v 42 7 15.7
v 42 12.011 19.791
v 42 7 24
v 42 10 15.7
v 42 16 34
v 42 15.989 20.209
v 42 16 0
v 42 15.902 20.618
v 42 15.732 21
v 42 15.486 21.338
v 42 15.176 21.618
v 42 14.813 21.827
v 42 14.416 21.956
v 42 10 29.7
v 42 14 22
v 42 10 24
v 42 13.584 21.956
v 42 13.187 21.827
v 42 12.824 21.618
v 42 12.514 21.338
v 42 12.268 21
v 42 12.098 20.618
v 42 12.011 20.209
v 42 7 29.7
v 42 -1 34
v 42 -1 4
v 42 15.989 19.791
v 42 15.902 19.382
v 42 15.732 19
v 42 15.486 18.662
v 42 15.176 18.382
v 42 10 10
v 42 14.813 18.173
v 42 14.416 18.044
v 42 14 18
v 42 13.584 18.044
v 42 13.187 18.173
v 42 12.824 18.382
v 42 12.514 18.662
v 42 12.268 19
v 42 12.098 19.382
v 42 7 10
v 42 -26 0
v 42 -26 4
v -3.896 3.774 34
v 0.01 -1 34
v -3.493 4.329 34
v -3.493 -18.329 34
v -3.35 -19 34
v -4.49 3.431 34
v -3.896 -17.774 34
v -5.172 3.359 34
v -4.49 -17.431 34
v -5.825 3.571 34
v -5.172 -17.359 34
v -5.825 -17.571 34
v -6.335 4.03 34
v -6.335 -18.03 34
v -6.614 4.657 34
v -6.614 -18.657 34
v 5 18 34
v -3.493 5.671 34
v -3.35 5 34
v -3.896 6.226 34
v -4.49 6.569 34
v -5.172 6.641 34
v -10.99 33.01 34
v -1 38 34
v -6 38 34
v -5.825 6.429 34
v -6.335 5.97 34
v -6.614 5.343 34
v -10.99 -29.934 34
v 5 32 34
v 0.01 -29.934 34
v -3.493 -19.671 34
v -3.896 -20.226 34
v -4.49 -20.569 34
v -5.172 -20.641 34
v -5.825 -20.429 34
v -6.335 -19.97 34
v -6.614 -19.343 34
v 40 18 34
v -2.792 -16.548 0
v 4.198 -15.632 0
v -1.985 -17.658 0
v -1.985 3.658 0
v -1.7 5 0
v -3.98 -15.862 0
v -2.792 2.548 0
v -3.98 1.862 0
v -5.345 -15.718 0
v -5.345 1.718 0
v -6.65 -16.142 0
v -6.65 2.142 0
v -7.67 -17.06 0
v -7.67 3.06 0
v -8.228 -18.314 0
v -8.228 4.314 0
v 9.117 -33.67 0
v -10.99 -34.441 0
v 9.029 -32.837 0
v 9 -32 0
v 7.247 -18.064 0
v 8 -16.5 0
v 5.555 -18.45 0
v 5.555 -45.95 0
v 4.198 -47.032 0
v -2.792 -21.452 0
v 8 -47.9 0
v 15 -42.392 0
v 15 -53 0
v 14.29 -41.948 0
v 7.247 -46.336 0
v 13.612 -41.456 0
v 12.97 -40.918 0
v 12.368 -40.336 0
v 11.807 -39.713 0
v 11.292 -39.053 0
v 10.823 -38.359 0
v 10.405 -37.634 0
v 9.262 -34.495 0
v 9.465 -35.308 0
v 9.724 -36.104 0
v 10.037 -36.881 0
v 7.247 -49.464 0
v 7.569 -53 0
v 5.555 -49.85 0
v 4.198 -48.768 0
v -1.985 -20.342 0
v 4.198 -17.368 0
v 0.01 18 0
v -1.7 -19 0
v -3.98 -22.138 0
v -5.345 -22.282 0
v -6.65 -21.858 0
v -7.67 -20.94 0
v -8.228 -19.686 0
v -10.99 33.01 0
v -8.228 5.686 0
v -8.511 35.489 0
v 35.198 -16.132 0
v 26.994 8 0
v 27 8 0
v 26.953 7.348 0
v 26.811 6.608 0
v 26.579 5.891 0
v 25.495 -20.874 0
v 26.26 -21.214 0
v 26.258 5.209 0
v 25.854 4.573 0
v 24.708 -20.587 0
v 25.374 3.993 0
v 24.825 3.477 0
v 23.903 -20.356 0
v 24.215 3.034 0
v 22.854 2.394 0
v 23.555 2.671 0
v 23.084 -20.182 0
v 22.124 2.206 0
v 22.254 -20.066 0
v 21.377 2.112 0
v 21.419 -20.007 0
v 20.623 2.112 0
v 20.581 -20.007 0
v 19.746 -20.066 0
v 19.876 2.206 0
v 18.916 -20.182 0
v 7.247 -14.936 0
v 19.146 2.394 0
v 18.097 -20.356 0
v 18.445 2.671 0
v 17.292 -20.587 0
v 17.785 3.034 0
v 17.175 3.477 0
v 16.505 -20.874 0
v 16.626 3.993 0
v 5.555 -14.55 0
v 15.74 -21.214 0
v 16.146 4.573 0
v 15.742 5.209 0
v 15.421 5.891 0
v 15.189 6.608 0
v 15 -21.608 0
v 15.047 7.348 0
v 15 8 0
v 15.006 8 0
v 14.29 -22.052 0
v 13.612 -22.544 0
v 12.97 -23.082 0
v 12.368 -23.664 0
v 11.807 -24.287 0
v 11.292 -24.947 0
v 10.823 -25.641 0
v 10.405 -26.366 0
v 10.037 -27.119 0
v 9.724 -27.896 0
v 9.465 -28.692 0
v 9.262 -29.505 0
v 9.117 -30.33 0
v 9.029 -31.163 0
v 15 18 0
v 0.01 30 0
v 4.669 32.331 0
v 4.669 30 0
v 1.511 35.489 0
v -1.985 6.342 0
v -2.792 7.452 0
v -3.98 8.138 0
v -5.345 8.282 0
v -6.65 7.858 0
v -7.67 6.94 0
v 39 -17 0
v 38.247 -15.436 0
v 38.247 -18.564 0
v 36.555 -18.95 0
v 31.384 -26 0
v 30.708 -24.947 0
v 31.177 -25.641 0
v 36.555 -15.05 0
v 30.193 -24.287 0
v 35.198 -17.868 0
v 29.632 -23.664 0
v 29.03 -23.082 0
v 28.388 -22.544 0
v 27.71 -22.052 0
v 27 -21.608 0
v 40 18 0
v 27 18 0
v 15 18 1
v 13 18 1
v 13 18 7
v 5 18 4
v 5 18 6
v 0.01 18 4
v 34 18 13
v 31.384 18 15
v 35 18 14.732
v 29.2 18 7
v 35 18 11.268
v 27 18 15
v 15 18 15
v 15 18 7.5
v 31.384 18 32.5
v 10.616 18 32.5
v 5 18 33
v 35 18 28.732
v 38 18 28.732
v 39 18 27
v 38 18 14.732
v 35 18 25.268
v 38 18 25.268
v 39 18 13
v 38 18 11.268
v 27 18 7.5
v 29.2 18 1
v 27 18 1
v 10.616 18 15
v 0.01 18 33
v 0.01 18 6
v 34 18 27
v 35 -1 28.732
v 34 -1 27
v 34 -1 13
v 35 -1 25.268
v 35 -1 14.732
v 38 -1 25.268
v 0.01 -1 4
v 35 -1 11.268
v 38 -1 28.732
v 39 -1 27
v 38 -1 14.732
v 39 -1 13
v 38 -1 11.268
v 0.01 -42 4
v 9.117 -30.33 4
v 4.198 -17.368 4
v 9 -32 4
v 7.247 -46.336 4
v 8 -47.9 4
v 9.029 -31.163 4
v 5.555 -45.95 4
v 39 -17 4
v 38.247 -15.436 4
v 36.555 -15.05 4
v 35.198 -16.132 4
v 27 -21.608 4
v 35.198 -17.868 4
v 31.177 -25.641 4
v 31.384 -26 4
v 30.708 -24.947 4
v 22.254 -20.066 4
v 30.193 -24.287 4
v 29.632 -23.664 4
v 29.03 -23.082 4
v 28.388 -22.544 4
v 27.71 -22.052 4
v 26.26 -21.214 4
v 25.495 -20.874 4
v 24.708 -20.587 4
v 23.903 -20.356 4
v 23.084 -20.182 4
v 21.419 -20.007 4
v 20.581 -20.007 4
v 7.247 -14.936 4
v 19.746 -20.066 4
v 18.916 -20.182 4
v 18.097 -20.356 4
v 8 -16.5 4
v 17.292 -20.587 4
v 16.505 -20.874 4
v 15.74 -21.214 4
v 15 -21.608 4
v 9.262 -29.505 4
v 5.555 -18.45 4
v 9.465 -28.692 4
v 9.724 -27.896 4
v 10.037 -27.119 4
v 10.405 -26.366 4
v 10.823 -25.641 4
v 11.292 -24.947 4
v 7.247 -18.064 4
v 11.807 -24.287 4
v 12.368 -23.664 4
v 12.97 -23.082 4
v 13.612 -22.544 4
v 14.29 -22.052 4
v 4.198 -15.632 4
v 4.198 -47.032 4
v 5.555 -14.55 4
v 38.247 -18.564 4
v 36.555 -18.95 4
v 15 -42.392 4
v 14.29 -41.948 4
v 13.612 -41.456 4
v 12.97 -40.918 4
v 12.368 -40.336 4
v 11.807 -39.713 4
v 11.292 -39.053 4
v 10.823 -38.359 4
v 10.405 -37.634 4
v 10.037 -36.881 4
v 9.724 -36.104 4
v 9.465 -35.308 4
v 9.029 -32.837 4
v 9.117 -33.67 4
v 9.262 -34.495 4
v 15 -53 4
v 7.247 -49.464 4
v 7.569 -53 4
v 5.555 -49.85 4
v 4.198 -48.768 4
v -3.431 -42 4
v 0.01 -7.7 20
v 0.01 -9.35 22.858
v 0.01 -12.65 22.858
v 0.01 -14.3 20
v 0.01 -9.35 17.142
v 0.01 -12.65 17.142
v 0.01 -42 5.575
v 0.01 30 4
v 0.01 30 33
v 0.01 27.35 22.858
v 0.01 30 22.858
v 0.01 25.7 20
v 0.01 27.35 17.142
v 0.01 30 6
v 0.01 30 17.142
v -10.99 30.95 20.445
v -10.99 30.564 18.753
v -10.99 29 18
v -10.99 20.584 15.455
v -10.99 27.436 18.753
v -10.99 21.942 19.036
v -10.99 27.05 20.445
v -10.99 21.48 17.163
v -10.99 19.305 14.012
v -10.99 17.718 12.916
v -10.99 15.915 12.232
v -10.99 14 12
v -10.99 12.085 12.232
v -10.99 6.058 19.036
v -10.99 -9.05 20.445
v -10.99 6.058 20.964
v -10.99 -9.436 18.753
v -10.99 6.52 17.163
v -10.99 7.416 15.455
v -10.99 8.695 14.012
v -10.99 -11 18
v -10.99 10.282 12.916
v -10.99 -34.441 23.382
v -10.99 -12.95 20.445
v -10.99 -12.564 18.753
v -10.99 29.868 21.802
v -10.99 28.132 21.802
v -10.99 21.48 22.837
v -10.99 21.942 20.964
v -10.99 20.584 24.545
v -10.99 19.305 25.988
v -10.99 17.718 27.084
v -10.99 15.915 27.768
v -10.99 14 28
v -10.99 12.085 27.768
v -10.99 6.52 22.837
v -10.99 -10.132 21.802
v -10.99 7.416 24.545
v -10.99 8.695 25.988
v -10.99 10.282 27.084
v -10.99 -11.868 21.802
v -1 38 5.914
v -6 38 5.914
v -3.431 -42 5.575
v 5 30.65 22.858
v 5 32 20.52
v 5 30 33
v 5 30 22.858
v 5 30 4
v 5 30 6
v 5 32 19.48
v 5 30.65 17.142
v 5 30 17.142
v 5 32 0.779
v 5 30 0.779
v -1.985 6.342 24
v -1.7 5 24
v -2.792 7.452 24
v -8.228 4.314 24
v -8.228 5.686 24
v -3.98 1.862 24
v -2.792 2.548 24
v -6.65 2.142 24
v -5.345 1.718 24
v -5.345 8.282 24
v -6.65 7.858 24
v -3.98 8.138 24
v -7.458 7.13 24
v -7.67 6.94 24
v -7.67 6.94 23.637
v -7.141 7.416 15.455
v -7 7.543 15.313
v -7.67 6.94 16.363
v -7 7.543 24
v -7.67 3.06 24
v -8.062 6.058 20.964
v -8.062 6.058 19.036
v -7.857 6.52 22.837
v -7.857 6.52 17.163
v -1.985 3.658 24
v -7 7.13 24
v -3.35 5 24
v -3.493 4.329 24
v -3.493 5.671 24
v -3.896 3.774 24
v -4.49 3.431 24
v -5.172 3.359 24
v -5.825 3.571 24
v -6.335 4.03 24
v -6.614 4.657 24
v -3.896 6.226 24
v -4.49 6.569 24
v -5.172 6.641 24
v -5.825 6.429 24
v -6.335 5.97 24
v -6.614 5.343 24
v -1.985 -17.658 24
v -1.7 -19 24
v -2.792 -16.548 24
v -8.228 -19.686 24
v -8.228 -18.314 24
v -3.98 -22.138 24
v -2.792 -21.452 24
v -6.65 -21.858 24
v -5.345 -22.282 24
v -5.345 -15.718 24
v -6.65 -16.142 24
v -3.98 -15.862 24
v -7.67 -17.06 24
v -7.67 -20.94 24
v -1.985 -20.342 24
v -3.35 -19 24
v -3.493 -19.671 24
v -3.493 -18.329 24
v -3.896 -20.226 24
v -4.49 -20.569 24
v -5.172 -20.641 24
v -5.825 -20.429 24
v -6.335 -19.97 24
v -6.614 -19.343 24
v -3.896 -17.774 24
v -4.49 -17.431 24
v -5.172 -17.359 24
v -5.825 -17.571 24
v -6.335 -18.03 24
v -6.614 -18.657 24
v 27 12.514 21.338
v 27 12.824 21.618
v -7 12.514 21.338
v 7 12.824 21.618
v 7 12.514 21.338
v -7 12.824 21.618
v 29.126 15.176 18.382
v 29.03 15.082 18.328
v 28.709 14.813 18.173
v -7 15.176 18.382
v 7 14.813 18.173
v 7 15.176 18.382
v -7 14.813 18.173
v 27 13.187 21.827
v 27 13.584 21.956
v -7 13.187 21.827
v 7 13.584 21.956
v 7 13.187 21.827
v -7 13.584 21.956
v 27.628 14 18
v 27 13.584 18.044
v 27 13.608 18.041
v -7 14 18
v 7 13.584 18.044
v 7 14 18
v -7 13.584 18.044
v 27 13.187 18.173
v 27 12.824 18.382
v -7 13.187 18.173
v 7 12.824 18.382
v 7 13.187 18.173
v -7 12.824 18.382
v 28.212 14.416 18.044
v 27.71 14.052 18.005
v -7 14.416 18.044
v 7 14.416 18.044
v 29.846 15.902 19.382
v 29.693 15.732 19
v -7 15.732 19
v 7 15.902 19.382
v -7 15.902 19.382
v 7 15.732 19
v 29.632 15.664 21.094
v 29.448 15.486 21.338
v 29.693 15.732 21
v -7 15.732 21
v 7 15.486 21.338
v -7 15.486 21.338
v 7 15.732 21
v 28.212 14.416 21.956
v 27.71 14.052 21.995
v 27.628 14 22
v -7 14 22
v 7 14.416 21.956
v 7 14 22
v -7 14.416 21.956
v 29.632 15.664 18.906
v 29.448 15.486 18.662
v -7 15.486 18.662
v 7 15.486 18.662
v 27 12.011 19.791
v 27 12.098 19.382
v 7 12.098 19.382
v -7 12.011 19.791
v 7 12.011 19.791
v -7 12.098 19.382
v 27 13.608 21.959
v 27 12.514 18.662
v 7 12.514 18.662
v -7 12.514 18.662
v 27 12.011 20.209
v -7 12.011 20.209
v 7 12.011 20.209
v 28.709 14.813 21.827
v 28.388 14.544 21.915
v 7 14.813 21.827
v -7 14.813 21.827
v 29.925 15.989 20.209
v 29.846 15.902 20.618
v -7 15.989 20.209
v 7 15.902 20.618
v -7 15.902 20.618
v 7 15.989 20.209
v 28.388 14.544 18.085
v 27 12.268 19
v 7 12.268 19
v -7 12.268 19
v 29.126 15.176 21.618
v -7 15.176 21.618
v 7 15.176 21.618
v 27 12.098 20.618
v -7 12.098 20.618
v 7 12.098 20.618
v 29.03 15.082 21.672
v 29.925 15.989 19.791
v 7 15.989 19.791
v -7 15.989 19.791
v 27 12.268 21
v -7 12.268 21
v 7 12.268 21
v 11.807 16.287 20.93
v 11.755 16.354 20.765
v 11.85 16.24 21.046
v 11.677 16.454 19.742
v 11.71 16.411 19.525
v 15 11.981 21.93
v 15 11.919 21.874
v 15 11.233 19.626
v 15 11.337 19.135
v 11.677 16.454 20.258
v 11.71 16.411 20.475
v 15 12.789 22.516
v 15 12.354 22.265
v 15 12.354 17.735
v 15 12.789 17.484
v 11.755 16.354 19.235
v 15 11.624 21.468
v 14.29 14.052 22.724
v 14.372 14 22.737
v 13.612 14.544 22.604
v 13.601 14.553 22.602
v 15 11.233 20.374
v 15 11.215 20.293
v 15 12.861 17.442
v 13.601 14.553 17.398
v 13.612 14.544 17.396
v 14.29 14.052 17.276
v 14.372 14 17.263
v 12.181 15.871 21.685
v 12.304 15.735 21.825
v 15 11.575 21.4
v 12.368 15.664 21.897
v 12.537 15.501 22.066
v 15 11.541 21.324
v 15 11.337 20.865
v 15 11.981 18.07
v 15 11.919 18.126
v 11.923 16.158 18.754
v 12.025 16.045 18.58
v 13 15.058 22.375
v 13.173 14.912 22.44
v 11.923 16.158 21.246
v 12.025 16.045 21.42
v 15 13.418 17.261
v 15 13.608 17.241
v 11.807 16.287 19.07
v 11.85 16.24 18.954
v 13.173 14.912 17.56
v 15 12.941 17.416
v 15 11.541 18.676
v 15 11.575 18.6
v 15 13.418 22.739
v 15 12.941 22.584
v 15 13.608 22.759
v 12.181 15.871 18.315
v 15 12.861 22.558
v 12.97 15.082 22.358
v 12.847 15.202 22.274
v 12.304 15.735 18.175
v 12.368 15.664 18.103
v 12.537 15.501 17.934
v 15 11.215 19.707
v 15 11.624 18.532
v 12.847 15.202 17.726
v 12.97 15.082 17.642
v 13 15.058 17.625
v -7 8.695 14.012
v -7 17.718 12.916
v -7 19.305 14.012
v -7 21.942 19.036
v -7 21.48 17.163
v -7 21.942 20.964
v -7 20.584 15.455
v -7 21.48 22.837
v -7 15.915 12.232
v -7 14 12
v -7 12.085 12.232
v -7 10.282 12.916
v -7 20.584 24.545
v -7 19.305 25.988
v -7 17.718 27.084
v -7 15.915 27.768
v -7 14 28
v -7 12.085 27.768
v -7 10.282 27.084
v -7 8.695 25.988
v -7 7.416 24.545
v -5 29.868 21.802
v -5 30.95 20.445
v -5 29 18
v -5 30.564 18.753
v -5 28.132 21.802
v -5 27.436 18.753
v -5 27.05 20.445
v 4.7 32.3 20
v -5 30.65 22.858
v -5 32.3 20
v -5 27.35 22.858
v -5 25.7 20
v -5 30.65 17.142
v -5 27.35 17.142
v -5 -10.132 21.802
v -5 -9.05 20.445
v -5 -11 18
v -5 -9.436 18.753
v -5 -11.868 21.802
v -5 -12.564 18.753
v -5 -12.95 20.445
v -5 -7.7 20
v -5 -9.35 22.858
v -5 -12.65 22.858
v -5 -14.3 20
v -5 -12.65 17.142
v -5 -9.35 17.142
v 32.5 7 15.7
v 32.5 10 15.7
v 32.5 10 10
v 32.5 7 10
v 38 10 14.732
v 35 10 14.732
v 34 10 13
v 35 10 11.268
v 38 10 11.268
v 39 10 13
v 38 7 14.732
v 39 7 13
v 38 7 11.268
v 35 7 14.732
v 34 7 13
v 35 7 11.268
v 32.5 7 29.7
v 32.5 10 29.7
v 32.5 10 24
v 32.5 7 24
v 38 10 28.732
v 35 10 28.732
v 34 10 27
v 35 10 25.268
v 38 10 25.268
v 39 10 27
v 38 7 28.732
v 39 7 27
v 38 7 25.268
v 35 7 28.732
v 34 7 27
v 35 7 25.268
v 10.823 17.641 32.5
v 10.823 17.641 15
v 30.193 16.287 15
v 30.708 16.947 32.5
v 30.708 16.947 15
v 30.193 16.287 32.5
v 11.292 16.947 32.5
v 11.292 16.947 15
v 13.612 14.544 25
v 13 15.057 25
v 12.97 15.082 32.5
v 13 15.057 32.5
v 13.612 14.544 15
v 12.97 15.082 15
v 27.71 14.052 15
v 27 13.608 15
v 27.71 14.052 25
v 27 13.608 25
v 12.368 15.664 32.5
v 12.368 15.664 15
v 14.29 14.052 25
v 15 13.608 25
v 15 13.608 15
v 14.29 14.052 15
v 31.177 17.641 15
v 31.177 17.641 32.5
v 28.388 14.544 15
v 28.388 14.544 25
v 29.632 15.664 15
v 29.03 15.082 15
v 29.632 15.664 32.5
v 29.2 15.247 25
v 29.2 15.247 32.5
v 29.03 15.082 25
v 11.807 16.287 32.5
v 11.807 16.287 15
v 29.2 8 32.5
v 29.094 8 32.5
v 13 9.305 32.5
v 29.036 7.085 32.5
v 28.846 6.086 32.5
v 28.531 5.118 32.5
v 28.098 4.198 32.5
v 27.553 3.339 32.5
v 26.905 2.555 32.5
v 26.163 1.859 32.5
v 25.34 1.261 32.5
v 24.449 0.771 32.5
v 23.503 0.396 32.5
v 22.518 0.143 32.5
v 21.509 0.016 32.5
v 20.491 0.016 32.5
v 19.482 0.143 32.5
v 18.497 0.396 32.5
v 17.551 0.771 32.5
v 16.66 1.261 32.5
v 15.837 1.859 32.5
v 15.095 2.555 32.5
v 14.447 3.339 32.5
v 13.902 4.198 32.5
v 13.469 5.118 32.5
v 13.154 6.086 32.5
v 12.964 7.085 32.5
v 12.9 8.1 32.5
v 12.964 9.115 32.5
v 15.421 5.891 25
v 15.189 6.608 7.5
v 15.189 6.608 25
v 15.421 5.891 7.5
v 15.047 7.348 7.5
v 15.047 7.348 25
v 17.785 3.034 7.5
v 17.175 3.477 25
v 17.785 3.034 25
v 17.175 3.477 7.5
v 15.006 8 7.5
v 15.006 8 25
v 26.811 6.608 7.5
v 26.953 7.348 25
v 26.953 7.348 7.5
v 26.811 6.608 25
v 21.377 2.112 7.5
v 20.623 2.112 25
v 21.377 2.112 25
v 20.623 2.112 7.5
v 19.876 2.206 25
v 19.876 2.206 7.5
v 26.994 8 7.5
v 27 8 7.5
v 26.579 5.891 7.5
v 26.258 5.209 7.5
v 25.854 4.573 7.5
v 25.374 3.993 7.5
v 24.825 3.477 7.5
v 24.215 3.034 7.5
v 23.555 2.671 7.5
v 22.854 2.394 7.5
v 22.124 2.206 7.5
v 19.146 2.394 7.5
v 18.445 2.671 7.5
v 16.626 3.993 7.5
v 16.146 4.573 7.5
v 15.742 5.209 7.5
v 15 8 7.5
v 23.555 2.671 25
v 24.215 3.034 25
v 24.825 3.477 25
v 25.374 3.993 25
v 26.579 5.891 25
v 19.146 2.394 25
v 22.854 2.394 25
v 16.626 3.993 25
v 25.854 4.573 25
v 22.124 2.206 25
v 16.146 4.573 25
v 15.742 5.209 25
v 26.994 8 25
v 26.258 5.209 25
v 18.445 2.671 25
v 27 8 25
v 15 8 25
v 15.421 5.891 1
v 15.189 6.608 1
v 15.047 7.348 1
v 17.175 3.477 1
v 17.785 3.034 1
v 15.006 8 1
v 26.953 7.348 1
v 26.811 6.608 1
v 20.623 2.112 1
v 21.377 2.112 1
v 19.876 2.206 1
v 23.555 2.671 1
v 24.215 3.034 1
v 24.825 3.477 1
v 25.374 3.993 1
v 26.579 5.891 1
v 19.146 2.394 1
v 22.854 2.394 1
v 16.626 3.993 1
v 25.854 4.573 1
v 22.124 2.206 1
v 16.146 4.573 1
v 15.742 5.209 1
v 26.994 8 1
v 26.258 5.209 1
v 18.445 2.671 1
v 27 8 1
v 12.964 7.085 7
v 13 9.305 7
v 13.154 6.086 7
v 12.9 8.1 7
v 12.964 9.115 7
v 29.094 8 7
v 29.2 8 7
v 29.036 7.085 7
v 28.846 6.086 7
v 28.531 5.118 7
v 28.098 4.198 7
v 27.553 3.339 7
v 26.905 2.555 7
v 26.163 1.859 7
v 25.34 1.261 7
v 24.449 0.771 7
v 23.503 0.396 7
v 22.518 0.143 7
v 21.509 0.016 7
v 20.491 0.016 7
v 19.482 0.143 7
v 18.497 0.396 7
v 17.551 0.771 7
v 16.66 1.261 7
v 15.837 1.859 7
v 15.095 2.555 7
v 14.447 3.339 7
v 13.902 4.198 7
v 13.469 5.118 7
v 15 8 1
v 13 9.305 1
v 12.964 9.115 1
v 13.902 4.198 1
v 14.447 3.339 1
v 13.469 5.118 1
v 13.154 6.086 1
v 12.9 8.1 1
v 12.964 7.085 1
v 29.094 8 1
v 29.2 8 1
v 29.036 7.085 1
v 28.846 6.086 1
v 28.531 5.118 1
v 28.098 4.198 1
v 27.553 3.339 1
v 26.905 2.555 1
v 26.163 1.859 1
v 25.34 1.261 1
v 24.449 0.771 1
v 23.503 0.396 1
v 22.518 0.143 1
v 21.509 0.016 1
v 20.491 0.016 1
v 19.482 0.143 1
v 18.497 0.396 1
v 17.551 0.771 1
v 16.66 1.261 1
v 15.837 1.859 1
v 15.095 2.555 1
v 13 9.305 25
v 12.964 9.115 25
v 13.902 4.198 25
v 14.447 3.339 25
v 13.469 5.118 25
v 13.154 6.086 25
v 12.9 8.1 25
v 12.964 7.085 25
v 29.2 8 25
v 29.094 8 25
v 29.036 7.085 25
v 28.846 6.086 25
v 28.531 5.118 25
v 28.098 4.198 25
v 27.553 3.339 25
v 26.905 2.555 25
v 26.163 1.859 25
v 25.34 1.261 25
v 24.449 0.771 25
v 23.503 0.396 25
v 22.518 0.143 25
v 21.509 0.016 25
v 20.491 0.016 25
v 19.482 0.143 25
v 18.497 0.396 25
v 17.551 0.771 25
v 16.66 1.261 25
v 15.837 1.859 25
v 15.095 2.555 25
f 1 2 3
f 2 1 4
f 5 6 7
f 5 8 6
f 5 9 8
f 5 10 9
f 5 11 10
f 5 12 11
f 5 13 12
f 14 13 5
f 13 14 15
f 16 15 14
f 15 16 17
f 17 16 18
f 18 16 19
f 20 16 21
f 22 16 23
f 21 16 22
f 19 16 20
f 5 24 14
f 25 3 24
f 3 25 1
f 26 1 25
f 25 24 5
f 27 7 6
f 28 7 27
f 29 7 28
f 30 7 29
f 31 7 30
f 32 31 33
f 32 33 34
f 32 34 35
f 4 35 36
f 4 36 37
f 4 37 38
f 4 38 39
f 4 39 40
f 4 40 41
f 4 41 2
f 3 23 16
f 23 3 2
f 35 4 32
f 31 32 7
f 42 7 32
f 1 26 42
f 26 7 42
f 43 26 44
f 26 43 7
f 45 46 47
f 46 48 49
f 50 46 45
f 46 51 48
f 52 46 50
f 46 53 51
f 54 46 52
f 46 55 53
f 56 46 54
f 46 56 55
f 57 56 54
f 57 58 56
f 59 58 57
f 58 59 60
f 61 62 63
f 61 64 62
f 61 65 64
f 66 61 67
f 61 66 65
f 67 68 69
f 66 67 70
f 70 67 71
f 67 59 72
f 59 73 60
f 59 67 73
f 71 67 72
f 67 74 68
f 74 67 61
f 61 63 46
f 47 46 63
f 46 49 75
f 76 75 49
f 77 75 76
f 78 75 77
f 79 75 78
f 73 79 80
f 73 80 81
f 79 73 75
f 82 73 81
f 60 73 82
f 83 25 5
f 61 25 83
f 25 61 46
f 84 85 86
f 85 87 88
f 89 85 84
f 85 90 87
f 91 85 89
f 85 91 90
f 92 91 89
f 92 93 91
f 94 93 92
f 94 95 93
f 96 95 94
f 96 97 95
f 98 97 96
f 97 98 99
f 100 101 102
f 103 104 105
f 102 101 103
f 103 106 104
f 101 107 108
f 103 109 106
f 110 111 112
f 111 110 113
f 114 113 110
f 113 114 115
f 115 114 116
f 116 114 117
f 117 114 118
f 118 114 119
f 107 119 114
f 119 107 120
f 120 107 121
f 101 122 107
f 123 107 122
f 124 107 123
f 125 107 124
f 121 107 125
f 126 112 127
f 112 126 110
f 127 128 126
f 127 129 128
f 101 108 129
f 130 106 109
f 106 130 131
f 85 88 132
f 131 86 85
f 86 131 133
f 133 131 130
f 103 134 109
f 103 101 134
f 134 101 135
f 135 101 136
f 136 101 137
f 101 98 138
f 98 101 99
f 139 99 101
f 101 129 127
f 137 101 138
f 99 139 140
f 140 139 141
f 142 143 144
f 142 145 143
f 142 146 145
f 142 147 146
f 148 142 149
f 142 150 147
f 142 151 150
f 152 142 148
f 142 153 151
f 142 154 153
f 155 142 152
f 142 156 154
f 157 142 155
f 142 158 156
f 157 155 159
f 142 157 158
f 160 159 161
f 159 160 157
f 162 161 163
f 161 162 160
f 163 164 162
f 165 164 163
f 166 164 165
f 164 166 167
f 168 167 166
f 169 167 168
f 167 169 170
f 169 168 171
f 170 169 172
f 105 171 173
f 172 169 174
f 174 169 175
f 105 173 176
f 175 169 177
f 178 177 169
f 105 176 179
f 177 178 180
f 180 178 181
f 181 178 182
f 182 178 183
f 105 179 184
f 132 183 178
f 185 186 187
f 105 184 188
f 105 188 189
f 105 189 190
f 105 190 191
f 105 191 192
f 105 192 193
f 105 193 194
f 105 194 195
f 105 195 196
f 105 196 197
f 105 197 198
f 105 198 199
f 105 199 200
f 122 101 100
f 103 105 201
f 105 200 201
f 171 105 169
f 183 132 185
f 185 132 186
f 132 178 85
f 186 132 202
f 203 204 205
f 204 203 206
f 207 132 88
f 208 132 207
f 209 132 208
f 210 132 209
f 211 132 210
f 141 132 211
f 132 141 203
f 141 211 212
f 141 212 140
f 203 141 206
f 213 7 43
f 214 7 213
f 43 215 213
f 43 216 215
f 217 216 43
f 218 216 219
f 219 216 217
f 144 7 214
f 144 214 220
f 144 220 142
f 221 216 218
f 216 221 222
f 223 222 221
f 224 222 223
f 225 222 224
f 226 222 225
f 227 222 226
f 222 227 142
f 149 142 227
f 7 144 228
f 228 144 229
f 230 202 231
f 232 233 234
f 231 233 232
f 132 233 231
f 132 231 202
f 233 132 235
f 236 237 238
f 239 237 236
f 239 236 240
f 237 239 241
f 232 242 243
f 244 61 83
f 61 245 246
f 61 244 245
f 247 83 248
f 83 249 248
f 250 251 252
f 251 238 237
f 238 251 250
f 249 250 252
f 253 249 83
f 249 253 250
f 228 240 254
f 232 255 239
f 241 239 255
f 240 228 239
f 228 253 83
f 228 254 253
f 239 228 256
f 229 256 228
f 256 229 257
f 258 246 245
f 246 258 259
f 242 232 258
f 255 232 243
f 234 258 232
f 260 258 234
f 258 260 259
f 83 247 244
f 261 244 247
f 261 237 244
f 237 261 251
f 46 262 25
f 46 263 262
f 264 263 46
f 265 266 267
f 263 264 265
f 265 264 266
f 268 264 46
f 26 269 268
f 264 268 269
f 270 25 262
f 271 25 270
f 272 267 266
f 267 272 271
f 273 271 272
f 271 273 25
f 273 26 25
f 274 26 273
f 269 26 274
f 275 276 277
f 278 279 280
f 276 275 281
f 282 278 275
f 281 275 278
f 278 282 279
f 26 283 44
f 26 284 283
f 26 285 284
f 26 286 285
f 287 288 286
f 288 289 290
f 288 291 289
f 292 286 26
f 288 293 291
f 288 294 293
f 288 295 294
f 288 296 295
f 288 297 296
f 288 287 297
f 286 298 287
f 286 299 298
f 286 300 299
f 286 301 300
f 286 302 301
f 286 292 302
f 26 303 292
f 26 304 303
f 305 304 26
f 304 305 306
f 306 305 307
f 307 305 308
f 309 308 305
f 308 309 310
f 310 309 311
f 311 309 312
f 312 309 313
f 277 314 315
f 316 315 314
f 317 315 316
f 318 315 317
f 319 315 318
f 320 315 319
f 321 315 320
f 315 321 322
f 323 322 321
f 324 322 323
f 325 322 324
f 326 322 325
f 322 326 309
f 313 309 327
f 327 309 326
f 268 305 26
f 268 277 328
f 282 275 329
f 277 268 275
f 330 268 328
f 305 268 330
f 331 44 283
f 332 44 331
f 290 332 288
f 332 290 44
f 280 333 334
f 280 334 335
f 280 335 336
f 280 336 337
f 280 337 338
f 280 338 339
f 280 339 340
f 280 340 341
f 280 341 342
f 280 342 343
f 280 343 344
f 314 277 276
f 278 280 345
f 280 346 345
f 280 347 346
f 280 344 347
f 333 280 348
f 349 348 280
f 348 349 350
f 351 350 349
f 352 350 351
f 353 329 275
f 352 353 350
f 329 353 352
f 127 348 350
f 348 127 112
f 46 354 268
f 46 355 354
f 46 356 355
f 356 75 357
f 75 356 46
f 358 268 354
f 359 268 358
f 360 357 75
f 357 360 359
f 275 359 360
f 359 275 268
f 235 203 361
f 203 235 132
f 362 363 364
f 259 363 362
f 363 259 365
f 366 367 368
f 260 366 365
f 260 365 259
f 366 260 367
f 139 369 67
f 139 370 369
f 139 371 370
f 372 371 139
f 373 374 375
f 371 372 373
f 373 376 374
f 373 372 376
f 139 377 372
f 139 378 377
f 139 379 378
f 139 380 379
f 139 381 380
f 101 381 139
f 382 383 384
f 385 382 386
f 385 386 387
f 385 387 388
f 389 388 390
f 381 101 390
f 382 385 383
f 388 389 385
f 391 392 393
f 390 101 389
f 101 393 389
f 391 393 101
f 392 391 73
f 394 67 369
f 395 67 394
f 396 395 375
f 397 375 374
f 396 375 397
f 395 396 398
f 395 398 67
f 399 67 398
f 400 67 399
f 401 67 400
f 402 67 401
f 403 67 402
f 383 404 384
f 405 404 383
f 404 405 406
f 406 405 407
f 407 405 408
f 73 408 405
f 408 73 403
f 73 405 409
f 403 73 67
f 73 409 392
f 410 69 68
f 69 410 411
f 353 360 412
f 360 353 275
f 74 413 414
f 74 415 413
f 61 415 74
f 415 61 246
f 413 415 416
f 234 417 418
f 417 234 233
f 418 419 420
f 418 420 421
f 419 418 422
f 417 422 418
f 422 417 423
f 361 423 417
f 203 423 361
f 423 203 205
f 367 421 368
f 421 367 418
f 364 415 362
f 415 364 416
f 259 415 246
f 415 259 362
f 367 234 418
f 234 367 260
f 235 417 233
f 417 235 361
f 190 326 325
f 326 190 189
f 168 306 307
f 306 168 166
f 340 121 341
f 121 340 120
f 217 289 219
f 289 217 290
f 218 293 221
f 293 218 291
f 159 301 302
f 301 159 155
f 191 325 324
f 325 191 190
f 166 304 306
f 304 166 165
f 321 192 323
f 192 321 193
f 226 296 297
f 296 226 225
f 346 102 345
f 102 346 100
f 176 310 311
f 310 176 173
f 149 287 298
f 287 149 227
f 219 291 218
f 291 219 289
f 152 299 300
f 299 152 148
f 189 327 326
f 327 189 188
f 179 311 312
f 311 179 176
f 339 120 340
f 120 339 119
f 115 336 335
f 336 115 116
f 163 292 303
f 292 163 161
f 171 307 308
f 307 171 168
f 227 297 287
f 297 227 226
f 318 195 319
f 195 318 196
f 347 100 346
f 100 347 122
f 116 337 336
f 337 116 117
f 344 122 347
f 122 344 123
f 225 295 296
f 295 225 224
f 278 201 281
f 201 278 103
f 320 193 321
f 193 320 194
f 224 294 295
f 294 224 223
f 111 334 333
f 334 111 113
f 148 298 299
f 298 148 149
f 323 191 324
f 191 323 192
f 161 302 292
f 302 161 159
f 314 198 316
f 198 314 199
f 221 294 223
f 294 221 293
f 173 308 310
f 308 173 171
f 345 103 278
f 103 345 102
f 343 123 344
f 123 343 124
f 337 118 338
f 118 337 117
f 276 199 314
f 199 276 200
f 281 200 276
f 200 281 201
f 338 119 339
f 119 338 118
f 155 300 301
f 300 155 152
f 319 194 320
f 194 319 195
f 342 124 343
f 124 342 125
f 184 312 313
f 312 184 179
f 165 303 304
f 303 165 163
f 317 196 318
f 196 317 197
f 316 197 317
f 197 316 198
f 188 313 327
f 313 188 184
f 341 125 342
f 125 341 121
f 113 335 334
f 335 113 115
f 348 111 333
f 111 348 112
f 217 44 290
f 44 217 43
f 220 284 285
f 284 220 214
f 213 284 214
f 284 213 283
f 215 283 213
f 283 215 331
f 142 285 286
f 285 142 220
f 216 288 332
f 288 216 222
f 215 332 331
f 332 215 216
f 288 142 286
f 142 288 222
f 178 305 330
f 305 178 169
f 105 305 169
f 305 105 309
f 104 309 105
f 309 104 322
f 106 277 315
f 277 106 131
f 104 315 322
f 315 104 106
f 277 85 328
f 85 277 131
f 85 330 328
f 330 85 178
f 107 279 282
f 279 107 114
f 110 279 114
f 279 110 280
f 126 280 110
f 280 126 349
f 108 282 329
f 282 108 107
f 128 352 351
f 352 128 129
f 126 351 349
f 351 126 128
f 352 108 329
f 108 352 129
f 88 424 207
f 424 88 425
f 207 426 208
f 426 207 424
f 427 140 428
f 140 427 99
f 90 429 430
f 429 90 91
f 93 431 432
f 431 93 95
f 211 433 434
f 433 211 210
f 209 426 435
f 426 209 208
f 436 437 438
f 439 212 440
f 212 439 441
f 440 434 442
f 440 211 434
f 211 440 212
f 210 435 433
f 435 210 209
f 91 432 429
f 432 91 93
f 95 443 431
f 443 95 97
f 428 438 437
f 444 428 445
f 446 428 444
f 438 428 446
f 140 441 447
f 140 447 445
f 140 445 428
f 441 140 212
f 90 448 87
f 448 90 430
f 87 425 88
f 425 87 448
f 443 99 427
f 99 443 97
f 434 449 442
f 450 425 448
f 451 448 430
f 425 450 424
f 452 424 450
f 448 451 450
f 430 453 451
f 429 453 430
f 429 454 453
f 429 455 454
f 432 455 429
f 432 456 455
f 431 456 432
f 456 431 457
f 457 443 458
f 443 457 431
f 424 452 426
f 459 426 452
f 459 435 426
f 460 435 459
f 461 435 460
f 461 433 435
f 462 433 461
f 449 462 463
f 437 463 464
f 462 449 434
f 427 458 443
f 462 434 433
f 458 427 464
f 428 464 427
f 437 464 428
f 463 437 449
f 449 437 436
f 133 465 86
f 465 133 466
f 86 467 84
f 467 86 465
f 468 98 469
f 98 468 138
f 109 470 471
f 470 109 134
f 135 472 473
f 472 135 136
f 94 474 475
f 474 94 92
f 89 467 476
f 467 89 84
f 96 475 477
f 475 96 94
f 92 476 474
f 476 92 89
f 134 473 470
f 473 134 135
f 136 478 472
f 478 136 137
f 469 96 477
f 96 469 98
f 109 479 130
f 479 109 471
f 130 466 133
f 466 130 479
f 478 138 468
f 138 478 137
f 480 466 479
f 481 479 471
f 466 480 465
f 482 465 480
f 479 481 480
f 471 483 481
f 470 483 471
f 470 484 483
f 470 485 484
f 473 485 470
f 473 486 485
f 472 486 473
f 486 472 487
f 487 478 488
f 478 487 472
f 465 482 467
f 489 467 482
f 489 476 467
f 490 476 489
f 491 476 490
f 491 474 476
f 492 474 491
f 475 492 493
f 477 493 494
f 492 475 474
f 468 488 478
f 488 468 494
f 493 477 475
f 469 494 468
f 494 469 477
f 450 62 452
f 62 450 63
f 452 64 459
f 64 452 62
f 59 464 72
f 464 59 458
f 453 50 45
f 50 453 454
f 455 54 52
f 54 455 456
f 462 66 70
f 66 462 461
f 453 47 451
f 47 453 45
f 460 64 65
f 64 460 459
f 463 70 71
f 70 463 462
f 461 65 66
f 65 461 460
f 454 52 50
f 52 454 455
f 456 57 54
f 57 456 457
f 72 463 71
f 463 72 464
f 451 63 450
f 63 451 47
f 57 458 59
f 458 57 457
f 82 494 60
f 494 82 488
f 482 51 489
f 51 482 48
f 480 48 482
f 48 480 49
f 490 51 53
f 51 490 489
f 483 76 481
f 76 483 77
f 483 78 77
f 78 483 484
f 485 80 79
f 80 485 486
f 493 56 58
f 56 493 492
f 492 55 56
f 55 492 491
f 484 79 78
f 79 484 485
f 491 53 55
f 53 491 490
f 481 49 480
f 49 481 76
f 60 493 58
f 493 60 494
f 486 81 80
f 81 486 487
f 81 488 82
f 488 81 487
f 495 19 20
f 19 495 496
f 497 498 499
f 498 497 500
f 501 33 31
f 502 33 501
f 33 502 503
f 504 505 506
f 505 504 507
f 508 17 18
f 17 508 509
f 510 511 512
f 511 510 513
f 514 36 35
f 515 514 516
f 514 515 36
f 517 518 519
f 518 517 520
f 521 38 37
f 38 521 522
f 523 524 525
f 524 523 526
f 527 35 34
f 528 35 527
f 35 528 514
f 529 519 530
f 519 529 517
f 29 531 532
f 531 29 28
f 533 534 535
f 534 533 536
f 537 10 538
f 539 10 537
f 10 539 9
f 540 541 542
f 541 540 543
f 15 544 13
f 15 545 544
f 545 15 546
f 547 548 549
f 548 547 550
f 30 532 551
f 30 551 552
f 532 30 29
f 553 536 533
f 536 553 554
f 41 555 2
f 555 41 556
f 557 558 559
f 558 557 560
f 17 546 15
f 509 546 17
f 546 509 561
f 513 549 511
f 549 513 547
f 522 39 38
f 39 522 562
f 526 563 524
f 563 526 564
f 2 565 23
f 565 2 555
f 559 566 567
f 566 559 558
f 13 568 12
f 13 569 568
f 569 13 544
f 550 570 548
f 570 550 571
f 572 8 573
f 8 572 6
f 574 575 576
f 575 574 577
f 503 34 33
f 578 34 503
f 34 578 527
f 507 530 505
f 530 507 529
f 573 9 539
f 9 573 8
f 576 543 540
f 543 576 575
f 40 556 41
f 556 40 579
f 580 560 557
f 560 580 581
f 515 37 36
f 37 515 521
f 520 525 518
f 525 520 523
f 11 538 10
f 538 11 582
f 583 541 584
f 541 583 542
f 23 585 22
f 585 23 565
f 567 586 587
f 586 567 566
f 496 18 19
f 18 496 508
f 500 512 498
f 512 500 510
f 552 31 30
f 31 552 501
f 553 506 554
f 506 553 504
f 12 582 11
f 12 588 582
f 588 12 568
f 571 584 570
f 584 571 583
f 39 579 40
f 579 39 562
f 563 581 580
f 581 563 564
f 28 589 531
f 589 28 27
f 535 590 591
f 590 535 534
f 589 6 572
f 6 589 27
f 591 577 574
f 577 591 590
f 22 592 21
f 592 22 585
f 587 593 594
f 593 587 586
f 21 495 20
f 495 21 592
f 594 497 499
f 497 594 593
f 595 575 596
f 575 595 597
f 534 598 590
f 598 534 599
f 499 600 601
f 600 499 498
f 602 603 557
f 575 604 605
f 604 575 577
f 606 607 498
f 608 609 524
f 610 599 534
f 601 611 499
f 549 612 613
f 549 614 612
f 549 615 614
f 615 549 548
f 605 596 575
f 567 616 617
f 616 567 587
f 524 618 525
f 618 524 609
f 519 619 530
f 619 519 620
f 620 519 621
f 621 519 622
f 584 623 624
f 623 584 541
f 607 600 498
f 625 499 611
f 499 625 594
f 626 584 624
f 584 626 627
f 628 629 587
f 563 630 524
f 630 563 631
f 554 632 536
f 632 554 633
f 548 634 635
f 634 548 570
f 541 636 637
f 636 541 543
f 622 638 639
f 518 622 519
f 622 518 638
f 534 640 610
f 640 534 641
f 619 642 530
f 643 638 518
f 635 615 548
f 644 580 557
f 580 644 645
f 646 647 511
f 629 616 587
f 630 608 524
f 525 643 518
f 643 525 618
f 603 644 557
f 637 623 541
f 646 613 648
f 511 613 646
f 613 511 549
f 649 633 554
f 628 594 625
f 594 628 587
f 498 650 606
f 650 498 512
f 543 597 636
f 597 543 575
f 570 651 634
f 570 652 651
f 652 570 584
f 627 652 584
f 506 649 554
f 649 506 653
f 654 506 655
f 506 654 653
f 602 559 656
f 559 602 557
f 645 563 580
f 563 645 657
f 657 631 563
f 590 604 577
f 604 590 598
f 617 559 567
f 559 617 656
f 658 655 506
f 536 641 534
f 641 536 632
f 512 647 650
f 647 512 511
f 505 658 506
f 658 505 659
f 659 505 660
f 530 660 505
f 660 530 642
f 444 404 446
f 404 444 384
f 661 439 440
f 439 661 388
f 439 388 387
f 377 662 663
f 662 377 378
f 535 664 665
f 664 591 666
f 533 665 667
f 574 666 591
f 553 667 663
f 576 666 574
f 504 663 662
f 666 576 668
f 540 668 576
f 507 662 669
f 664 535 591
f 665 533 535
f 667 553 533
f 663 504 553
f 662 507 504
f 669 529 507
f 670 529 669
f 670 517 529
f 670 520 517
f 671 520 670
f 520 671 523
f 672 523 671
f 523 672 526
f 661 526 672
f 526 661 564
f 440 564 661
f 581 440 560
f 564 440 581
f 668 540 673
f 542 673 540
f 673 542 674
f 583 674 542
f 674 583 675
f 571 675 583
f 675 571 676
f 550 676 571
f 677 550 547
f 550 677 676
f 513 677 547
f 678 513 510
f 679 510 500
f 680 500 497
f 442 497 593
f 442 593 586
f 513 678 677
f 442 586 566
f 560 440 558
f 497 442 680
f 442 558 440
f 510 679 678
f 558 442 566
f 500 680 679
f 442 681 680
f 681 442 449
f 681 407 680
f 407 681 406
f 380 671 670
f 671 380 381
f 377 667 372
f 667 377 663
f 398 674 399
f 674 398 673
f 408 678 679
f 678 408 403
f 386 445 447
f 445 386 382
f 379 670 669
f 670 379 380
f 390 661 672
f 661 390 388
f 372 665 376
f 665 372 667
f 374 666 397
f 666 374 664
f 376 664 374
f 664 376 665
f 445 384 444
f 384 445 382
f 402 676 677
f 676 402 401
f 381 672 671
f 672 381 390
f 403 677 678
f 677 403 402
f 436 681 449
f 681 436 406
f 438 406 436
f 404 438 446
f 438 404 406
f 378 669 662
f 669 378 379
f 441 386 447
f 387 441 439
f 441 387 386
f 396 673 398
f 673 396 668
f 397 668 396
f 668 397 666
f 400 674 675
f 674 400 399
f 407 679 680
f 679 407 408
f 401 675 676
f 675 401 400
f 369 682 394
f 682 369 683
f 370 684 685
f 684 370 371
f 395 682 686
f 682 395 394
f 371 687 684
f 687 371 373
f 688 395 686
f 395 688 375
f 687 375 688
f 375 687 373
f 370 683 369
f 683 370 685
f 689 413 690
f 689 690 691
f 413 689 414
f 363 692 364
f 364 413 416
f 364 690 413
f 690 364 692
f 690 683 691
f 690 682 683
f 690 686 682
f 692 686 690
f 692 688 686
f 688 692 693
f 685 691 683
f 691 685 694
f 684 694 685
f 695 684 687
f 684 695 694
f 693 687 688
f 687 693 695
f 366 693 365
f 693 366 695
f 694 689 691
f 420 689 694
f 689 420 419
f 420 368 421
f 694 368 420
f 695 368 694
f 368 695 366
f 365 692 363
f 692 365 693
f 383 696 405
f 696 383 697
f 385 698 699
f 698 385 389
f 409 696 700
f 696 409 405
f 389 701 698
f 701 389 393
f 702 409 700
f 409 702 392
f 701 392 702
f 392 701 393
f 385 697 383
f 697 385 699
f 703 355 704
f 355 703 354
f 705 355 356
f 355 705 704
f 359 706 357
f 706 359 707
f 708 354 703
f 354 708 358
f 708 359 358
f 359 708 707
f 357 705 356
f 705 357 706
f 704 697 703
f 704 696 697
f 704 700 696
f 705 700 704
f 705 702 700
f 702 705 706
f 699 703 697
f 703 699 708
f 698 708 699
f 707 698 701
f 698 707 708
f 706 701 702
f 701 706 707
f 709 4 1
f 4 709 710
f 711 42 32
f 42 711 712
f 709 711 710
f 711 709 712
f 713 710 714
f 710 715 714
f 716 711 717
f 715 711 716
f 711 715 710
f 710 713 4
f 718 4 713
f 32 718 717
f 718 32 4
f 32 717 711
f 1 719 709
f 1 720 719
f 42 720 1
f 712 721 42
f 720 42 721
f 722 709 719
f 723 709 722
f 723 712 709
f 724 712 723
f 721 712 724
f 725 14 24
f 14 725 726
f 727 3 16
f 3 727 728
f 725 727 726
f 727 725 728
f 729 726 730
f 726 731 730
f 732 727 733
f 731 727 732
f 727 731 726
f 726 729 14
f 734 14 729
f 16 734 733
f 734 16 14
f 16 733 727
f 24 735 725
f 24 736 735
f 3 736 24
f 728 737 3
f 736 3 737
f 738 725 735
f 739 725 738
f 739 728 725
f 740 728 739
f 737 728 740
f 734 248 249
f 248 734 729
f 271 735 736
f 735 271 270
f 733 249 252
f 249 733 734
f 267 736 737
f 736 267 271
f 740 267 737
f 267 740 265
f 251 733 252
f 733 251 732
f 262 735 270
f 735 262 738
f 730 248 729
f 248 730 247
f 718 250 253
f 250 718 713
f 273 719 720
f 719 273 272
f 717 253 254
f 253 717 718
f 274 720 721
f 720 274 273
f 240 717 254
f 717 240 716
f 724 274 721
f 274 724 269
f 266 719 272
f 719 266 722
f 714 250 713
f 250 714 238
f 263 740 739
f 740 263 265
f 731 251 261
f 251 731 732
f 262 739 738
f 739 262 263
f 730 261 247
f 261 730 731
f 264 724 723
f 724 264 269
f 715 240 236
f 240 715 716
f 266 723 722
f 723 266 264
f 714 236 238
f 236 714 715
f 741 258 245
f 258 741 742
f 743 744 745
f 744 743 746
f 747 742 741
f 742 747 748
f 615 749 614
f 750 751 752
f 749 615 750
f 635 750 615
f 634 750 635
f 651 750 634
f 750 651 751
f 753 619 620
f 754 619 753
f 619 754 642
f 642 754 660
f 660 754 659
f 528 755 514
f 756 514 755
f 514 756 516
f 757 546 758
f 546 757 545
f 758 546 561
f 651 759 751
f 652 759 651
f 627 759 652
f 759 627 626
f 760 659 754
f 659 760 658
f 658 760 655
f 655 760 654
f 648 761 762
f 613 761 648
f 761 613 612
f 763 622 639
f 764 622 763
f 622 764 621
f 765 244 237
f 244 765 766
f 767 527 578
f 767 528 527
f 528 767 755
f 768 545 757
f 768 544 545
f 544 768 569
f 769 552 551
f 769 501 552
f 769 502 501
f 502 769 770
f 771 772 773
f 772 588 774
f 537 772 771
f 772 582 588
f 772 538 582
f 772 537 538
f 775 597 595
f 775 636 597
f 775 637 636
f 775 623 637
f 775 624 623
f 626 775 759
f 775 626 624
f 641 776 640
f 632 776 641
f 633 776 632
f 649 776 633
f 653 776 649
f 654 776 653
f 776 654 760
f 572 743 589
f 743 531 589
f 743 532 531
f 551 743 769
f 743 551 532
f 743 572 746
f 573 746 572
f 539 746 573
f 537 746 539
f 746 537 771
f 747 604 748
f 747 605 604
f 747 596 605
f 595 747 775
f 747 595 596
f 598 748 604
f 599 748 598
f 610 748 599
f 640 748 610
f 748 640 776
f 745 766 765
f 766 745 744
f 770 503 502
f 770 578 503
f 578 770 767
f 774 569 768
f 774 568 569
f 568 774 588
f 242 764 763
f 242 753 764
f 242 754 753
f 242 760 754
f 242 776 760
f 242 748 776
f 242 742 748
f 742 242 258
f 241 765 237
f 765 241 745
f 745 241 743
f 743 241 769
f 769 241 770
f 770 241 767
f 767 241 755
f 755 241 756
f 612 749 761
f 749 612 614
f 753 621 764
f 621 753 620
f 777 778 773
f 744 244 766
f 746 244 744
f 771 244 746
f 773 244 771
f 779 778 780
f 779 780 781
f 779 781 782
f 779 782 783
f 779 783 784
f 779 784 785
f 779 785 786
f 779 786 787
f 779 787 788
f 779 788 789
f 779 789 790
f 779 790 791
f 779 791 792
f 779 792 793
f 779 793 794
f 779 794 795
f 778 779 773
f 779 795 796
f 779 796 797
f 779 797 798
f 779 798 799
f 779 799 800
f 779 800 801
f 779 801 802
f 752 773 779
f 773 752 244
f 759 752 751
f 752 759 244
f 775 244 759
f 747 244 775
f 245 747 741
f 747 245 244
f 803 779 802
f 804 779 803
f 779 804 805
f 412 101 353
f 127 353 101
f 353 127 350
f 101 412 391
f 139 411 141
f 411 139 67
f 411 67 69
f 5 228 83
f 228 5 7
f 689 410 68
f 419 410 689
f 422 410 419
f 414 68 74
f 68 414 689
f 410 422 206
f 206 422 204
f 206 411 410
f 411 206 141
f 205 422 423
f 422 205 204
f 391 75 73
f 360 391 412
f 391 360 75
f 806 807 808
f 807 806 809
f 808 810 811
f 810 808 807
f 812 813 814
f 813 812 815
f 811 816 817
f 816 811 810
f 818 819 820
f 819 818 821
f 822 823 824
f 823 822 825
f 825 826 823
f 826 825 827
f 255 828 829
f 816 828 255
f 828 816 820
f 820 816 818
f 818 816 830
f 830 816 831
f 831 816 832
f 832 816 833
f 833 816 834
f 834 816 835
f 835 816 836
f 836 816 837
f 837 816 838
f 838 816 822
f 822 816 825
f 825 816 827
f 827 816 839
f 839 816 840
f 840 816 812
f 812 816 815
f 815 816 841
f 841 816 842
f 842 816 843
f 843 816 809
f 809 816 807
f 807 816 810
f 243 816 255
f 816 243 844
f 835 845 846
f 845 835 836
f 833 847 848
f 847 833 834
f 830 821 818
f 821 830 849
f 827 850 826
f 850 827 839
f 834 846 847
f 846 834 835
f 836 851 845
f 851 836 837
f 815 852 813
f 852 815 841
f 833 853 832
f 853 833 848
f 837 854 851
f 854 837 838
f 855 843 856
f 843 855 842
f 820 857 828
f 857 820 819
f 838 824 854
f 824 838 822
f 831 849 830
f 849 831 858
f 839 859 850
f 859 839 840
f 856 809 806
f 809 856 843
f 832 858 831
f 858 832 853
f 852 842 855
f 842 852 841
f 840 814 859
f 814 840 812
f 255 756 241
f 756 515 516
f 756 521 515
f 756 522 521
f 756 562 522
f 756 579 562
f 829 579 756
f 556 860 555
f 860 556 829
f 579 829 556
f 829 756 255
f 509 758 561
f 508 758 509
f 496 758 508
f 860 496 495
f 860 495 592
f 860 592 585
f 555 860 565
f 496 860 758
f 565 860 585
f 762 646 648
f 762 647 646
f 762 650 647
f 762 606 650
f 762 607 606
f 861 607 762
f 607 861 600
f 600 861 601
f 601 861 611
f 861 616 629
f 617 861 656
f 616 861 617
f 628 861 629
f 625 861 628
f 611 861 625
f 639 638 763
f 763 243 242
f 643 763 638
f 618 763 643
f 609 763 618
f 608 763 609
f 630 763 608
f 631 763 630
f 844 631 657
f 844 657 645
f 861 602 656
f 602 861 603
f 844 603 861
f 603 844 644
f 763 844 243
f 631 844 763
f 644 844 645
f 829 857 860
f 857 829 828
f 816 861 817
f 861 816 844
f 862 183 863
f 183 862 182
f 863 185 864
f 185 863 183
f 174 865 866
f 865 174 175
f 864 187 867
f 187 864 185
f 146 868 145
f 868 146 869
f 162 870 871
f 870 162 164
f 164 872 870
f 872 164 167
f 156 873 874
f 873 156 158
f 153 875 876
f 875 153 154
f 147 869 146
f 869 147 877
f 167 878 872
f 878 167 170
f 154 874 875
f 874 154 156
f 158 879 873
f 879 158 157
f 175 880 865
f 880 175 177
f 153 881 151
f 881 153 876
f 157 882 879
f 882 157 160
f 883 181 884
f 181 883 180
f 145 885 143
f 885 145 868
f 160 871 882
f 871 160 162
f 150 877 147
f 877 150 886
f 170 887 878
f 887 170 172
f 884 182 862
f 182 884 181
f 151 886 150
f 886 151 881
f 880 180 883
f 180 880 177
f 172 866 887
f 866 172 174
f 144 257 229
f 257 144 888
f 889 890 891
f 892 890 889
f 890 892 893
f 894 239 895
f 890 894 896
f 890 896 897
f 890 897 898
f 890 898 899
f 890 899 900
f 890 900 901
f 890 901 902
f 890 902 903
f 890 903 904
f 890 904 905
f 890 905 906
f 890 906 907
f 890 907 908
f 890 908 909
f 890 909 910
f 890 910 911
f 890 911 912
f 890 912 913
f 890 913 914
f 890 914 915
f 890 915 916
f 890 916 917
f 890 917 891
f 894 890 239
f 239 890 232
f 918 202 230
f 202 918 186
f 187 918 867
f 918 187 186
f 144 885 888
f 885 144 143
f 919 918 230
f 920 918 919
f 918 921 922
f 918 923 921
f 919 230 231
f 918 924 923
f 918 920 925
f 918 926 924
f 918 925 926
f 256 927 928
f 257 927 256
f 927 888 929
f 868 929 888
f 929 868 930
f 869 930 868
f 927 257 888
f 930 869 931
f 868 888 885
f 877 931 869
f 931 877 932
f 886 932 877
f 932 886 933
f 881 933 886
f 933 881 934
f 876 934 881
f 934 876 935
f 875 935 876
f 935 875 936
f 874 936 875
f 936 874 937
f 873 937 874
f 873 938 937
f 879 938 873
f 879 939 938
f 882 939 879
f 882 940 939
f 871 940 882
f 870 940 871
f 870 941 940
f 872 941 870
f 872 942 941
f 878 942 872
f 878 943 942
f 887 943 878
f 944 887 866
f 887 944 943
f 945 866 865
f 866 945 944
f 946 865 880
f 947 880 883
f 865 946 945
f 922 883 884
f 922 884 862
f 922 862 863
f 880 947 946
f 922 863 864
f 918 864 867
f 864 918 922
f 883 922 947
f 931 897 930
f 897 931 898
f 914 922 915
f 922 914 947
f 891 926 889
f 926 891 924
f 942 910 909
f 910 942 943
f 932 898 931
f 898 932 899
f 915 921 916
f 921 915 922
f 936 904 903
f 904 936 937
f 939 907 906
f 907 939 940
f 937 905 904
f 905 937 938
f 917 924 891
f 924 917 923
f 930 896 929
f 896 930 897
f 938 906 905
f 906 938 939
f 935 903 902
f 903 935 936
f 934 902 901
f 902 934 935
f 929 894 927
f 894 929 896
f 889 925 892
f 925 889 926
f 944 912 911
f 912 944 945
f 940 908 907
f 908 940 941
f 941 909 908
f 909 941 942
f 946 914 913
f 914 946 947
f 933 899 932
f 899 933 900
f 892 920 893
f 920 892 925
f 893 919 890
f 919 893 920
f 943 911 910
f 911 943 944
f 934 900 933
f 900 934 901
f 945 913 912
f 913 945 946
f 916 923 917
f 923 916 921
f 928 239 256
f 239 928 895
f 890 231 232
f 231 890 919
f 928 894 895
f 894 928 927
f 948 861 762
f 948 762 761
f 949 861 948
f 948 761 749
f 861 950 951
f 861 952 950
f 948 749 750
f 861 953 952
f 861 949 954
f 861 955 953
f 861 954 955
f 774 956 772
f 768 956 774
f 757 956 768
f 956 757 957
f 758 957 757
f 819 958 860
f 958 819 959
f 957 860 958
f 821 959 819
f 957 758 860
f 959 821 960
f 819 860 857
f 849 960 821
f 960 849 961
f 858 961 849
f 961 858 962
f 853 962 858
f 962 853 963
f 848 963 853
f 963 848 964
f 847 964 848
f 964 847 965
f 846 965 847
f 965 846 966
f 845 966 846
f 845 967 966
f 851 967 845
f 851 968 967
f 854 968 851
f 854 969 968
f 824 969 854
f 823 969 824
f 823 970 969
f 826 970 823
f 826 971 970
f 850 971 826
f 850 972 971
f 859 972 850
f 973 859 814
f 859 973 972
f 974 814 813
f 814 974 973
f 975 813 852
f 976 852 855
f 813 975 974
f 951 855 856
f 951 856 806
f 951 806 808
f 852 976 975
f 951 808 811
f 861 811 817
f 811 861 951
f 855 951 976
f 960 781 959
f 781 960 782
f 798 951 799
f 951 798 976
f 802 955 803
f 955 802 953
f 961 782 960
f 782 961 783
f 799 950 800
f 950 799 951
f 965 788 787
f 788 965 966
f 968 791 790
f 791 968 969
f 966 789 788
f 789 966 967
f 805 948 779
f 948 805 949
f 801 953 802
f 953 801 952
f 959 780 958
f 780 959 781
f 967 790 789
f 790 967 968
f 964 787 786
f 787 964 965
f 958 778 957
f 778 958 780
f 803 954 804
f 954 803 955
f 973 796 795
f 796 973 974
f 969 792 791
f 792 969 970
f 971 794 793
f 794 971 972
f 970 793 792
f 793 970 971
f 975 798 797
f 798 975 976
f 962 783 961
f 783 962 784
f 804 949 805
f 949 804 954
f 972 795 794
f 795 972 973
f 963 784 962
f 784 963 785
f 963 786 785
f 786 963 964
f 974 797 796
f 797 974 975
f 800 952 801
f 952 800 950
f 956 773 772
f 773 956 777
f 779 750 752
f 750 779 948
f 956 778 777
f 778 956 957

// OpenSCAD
// PRUSA iteration3
// NEMA 17 extruder body
// GNU GPL v3
// Josef Průša <iam@josefprusa.cz>, Kliment Yanev and contributors
// http://www.reprap.org/wiki/Prusa_Mendel
// http://prusamendel.org

module nozzlemount(){
	// Filament hole	
	rotate([0,90,0]) cylinder(r=2, h=70, $fn=30);

	// Tapered filament intake after the drive gear
	translate([17,0,0]) rotate([0,90,0]) cylinder(r2=3,r1=2, h=10, $fn=30);

	translate([-1,0,0]) rotate([0,90,0]) cylinder(r=8, h=4);

	// Front nozzle mount hole
	translate([-2,15,0]) rotate([0,90,0]) cylinder(r=2, h=70);

	// Front nozzle mount hole NUT TRAP
	translate([10-5,15,0]) rotate([0,90,0]) rotate([0,0,30]) cylinder(r=3.3, h=70,$fn=6);

	// Back nozzle mount hole
	translate([-2,-25,0]) rotate([0,90,0]) cylinder(r=2, h=70);

	// Back nozzle mount hole NUT TRAP
	translate([10-5,-25,0]) rotate([0,90,0]) rotate([0,0,30])cylinder(r=3.3, h=70,$fn=6);
}

motor_lenght = 30;


// Calculated values

	// Total height of the part is motor lenght plus front plate
	total_height = motor_lenght + 4;

difference(){
union(){
	// Base where drive gear is placed
	translate([0,-1,0])cube([42,19,total_height]);

	// Front plate (where motor mount is cutout)
	translate([0-5,-42-11,0]) cube([42+5,42+3+11,4]);

	// Base plate (nozzle is secured to it)
	translate([-8.99-2,-42,0]) cube([9+2,80,total_height]);

	// IDLER retainer
	translate([-1,30,0]) cube([6, 7, total_height]);

		// Top bridge holding idler retainer form springing
		translate([-1,15,total_height-1]) cube([6, 20, 1]);

		// Bottom bridge holding idler retainer form springing
		translate([-1,15,total_height-30]) cube([6, 20, 2]);
}

//Pretty corners

	// Cutaway corner base plate (motor side)
	translate([-11,-91,-1])rotate([0,0,45])cube([40,40,60]);
	// Cutaway corner base plate (idler side)
	translate([-32,12,-1])rotate([0,0,45])cube([40,40,60]);

	// Cutaway corner base block (idler side)
	translate([46,12,-1])rotate([0,0,45])cube([40,40,60]);

	// Cutaway corner idler retainer
	translate([6,31,-1])rotate([0,0,45])cube([40,40,60]);

// Pretty cutouts
	// Idler retainer pretty cuts
	translate([-10,27,-0+(total_height-54)]) rotate([-23,0,0]) cube([20,12,50]);
	translate([0,27,7+(total_height-52)]) rotate([0,23,0]) cube([20,12,50]);

	// Base plate pretty cut
	translate([-11,-66+5,-2+14]) rotate([-23,0,0]) cube([12,20,90]);

// Motor mount
translate([0,-1-10,0.5]){

	// Motor axis circle cut
	translate([21,-21,-1]) cylinder(r=12, h=5, $fn=90);

	// Material and warp saving cut
	translate([15,-45,-1]) cube([30,30,5]);

	// Motor screw holes
	translate([21+16,-21+15,-1]) cylinder(r=2, h=5);
	translate([21-15,-21+15.5,-1]) cylinder(r=2, h=5);
	translate([21-15,-21-15.9,-1]) cylinder(r=2, h=5);

//translate([21+15.5,-21+15.5,-1]) cylinder(r=2, h=5);
//translate([21+15.5,-21-15.5,-1]) cylinder(r=2, h=5);
//translate([21-15.5,-21+15.5,-1]) cylinder(r=2, h=5);
//translate([21-15.5,-21-15.5,-1]) cylinder(r=2, h=5);
}

// Motor cables hole
translate([-5,-35,40.6]) cube([15,18,13]);



// Shaft cutouts

	// Main shaft cylinder cut
	translate([21,8.1,7.5]) cylinder(r=6, h=total_height-9, $fn=50);
	// Main shaft box cut
	translate([-6+21,8,7.5]) cube([12,12,total_height-12]);

	// Entry main shaft cylinder cut
	translate([21,8.1,-1]) cylinder(r=6, h=3, $fn=50);
	// Entry main shaft box cut
	translate([-6+21,8,-50+7]) cube([12,12,50]);

	// Front axis bearing cylinder cut
	translate([21,8.1,1]) cylinder(r=8.1, h=6, $fn=50);
	// Front axis bearing box cut
	translate([13,8,1]) cube([16.2,20,6]);

	// Back axis bearing cylinder cut
	translate([21,8.1,-5+total_height-4]) cylinder(r=8.1, h=7.5, $fn=50);
	// Back axis bearing box cut
	translate([13,8,total_height-9]) cube([16.2,20,7.5]);



// X-carriage mounting holes
translate([-5,5,0]){
	translate([0,0,-1])rotate([0,0,0])cylinder(r=3.3, h=total_height-10+1, $fn=15);
	translate([0,0-24,-1])rotate([0,0,0])cylinder(r=3.3, h=total_height-10+1, $fn=15);
	translate([0,0,total_height-22])rotate([0,0,0])cylinder(r=3.3/2, h=70, $fn=15);
	translate([0,0-24,total_height-22])rotate([0,0,0])cylinder(r=3.3/2, h=70, $fn=15);
}

// Idler nuts, filament channel and 608 idler bearing cut
translate([0,0,-(52-total_height)-2]){
	// Nozzle mounting holes
	translate([-10,2+8+4,52-12]) nozzlemount();
	// Front idler screw nut trap
	translate([32.5,7,52-12-7-3]) cube([15,3,5.7]);
	// Back idler screw nut trap
	translate([32.5,7,52-12-7-3+14]) cube([15,3,5.7]);

	// Back top idler screw hole
	translate([5+32,-1,52-12+7]) rotate([0,90,90]) rotate([0,0,30]) cylinder(r=2, h=40, $fn=6);
	// Back bottom idler screw hole
	translate([5+32,-1,52-12-7]) rotate([0,90,90]) rotate([0,0,30]) cylinder(r=2, h=40, $fn=6);
	// Front top idler screw hole
	translate([5+31,-1,52-12+7]) rotate([0,90,90]) rotate([0,0,30]) cylinder(r=2, h=40, $fn=6);
	// Front bottom idler screw hole
	translate([5+31,-1,52-12-7]) rotate([0,90,90]) rotate([0,0,30]) cylinder(r=2, h=40, $fn=6);

	// Idler 608 bearing cutout
	translate([21,24,35]) cylinder(r=12, h=17.5, $fn=90);


}


}
